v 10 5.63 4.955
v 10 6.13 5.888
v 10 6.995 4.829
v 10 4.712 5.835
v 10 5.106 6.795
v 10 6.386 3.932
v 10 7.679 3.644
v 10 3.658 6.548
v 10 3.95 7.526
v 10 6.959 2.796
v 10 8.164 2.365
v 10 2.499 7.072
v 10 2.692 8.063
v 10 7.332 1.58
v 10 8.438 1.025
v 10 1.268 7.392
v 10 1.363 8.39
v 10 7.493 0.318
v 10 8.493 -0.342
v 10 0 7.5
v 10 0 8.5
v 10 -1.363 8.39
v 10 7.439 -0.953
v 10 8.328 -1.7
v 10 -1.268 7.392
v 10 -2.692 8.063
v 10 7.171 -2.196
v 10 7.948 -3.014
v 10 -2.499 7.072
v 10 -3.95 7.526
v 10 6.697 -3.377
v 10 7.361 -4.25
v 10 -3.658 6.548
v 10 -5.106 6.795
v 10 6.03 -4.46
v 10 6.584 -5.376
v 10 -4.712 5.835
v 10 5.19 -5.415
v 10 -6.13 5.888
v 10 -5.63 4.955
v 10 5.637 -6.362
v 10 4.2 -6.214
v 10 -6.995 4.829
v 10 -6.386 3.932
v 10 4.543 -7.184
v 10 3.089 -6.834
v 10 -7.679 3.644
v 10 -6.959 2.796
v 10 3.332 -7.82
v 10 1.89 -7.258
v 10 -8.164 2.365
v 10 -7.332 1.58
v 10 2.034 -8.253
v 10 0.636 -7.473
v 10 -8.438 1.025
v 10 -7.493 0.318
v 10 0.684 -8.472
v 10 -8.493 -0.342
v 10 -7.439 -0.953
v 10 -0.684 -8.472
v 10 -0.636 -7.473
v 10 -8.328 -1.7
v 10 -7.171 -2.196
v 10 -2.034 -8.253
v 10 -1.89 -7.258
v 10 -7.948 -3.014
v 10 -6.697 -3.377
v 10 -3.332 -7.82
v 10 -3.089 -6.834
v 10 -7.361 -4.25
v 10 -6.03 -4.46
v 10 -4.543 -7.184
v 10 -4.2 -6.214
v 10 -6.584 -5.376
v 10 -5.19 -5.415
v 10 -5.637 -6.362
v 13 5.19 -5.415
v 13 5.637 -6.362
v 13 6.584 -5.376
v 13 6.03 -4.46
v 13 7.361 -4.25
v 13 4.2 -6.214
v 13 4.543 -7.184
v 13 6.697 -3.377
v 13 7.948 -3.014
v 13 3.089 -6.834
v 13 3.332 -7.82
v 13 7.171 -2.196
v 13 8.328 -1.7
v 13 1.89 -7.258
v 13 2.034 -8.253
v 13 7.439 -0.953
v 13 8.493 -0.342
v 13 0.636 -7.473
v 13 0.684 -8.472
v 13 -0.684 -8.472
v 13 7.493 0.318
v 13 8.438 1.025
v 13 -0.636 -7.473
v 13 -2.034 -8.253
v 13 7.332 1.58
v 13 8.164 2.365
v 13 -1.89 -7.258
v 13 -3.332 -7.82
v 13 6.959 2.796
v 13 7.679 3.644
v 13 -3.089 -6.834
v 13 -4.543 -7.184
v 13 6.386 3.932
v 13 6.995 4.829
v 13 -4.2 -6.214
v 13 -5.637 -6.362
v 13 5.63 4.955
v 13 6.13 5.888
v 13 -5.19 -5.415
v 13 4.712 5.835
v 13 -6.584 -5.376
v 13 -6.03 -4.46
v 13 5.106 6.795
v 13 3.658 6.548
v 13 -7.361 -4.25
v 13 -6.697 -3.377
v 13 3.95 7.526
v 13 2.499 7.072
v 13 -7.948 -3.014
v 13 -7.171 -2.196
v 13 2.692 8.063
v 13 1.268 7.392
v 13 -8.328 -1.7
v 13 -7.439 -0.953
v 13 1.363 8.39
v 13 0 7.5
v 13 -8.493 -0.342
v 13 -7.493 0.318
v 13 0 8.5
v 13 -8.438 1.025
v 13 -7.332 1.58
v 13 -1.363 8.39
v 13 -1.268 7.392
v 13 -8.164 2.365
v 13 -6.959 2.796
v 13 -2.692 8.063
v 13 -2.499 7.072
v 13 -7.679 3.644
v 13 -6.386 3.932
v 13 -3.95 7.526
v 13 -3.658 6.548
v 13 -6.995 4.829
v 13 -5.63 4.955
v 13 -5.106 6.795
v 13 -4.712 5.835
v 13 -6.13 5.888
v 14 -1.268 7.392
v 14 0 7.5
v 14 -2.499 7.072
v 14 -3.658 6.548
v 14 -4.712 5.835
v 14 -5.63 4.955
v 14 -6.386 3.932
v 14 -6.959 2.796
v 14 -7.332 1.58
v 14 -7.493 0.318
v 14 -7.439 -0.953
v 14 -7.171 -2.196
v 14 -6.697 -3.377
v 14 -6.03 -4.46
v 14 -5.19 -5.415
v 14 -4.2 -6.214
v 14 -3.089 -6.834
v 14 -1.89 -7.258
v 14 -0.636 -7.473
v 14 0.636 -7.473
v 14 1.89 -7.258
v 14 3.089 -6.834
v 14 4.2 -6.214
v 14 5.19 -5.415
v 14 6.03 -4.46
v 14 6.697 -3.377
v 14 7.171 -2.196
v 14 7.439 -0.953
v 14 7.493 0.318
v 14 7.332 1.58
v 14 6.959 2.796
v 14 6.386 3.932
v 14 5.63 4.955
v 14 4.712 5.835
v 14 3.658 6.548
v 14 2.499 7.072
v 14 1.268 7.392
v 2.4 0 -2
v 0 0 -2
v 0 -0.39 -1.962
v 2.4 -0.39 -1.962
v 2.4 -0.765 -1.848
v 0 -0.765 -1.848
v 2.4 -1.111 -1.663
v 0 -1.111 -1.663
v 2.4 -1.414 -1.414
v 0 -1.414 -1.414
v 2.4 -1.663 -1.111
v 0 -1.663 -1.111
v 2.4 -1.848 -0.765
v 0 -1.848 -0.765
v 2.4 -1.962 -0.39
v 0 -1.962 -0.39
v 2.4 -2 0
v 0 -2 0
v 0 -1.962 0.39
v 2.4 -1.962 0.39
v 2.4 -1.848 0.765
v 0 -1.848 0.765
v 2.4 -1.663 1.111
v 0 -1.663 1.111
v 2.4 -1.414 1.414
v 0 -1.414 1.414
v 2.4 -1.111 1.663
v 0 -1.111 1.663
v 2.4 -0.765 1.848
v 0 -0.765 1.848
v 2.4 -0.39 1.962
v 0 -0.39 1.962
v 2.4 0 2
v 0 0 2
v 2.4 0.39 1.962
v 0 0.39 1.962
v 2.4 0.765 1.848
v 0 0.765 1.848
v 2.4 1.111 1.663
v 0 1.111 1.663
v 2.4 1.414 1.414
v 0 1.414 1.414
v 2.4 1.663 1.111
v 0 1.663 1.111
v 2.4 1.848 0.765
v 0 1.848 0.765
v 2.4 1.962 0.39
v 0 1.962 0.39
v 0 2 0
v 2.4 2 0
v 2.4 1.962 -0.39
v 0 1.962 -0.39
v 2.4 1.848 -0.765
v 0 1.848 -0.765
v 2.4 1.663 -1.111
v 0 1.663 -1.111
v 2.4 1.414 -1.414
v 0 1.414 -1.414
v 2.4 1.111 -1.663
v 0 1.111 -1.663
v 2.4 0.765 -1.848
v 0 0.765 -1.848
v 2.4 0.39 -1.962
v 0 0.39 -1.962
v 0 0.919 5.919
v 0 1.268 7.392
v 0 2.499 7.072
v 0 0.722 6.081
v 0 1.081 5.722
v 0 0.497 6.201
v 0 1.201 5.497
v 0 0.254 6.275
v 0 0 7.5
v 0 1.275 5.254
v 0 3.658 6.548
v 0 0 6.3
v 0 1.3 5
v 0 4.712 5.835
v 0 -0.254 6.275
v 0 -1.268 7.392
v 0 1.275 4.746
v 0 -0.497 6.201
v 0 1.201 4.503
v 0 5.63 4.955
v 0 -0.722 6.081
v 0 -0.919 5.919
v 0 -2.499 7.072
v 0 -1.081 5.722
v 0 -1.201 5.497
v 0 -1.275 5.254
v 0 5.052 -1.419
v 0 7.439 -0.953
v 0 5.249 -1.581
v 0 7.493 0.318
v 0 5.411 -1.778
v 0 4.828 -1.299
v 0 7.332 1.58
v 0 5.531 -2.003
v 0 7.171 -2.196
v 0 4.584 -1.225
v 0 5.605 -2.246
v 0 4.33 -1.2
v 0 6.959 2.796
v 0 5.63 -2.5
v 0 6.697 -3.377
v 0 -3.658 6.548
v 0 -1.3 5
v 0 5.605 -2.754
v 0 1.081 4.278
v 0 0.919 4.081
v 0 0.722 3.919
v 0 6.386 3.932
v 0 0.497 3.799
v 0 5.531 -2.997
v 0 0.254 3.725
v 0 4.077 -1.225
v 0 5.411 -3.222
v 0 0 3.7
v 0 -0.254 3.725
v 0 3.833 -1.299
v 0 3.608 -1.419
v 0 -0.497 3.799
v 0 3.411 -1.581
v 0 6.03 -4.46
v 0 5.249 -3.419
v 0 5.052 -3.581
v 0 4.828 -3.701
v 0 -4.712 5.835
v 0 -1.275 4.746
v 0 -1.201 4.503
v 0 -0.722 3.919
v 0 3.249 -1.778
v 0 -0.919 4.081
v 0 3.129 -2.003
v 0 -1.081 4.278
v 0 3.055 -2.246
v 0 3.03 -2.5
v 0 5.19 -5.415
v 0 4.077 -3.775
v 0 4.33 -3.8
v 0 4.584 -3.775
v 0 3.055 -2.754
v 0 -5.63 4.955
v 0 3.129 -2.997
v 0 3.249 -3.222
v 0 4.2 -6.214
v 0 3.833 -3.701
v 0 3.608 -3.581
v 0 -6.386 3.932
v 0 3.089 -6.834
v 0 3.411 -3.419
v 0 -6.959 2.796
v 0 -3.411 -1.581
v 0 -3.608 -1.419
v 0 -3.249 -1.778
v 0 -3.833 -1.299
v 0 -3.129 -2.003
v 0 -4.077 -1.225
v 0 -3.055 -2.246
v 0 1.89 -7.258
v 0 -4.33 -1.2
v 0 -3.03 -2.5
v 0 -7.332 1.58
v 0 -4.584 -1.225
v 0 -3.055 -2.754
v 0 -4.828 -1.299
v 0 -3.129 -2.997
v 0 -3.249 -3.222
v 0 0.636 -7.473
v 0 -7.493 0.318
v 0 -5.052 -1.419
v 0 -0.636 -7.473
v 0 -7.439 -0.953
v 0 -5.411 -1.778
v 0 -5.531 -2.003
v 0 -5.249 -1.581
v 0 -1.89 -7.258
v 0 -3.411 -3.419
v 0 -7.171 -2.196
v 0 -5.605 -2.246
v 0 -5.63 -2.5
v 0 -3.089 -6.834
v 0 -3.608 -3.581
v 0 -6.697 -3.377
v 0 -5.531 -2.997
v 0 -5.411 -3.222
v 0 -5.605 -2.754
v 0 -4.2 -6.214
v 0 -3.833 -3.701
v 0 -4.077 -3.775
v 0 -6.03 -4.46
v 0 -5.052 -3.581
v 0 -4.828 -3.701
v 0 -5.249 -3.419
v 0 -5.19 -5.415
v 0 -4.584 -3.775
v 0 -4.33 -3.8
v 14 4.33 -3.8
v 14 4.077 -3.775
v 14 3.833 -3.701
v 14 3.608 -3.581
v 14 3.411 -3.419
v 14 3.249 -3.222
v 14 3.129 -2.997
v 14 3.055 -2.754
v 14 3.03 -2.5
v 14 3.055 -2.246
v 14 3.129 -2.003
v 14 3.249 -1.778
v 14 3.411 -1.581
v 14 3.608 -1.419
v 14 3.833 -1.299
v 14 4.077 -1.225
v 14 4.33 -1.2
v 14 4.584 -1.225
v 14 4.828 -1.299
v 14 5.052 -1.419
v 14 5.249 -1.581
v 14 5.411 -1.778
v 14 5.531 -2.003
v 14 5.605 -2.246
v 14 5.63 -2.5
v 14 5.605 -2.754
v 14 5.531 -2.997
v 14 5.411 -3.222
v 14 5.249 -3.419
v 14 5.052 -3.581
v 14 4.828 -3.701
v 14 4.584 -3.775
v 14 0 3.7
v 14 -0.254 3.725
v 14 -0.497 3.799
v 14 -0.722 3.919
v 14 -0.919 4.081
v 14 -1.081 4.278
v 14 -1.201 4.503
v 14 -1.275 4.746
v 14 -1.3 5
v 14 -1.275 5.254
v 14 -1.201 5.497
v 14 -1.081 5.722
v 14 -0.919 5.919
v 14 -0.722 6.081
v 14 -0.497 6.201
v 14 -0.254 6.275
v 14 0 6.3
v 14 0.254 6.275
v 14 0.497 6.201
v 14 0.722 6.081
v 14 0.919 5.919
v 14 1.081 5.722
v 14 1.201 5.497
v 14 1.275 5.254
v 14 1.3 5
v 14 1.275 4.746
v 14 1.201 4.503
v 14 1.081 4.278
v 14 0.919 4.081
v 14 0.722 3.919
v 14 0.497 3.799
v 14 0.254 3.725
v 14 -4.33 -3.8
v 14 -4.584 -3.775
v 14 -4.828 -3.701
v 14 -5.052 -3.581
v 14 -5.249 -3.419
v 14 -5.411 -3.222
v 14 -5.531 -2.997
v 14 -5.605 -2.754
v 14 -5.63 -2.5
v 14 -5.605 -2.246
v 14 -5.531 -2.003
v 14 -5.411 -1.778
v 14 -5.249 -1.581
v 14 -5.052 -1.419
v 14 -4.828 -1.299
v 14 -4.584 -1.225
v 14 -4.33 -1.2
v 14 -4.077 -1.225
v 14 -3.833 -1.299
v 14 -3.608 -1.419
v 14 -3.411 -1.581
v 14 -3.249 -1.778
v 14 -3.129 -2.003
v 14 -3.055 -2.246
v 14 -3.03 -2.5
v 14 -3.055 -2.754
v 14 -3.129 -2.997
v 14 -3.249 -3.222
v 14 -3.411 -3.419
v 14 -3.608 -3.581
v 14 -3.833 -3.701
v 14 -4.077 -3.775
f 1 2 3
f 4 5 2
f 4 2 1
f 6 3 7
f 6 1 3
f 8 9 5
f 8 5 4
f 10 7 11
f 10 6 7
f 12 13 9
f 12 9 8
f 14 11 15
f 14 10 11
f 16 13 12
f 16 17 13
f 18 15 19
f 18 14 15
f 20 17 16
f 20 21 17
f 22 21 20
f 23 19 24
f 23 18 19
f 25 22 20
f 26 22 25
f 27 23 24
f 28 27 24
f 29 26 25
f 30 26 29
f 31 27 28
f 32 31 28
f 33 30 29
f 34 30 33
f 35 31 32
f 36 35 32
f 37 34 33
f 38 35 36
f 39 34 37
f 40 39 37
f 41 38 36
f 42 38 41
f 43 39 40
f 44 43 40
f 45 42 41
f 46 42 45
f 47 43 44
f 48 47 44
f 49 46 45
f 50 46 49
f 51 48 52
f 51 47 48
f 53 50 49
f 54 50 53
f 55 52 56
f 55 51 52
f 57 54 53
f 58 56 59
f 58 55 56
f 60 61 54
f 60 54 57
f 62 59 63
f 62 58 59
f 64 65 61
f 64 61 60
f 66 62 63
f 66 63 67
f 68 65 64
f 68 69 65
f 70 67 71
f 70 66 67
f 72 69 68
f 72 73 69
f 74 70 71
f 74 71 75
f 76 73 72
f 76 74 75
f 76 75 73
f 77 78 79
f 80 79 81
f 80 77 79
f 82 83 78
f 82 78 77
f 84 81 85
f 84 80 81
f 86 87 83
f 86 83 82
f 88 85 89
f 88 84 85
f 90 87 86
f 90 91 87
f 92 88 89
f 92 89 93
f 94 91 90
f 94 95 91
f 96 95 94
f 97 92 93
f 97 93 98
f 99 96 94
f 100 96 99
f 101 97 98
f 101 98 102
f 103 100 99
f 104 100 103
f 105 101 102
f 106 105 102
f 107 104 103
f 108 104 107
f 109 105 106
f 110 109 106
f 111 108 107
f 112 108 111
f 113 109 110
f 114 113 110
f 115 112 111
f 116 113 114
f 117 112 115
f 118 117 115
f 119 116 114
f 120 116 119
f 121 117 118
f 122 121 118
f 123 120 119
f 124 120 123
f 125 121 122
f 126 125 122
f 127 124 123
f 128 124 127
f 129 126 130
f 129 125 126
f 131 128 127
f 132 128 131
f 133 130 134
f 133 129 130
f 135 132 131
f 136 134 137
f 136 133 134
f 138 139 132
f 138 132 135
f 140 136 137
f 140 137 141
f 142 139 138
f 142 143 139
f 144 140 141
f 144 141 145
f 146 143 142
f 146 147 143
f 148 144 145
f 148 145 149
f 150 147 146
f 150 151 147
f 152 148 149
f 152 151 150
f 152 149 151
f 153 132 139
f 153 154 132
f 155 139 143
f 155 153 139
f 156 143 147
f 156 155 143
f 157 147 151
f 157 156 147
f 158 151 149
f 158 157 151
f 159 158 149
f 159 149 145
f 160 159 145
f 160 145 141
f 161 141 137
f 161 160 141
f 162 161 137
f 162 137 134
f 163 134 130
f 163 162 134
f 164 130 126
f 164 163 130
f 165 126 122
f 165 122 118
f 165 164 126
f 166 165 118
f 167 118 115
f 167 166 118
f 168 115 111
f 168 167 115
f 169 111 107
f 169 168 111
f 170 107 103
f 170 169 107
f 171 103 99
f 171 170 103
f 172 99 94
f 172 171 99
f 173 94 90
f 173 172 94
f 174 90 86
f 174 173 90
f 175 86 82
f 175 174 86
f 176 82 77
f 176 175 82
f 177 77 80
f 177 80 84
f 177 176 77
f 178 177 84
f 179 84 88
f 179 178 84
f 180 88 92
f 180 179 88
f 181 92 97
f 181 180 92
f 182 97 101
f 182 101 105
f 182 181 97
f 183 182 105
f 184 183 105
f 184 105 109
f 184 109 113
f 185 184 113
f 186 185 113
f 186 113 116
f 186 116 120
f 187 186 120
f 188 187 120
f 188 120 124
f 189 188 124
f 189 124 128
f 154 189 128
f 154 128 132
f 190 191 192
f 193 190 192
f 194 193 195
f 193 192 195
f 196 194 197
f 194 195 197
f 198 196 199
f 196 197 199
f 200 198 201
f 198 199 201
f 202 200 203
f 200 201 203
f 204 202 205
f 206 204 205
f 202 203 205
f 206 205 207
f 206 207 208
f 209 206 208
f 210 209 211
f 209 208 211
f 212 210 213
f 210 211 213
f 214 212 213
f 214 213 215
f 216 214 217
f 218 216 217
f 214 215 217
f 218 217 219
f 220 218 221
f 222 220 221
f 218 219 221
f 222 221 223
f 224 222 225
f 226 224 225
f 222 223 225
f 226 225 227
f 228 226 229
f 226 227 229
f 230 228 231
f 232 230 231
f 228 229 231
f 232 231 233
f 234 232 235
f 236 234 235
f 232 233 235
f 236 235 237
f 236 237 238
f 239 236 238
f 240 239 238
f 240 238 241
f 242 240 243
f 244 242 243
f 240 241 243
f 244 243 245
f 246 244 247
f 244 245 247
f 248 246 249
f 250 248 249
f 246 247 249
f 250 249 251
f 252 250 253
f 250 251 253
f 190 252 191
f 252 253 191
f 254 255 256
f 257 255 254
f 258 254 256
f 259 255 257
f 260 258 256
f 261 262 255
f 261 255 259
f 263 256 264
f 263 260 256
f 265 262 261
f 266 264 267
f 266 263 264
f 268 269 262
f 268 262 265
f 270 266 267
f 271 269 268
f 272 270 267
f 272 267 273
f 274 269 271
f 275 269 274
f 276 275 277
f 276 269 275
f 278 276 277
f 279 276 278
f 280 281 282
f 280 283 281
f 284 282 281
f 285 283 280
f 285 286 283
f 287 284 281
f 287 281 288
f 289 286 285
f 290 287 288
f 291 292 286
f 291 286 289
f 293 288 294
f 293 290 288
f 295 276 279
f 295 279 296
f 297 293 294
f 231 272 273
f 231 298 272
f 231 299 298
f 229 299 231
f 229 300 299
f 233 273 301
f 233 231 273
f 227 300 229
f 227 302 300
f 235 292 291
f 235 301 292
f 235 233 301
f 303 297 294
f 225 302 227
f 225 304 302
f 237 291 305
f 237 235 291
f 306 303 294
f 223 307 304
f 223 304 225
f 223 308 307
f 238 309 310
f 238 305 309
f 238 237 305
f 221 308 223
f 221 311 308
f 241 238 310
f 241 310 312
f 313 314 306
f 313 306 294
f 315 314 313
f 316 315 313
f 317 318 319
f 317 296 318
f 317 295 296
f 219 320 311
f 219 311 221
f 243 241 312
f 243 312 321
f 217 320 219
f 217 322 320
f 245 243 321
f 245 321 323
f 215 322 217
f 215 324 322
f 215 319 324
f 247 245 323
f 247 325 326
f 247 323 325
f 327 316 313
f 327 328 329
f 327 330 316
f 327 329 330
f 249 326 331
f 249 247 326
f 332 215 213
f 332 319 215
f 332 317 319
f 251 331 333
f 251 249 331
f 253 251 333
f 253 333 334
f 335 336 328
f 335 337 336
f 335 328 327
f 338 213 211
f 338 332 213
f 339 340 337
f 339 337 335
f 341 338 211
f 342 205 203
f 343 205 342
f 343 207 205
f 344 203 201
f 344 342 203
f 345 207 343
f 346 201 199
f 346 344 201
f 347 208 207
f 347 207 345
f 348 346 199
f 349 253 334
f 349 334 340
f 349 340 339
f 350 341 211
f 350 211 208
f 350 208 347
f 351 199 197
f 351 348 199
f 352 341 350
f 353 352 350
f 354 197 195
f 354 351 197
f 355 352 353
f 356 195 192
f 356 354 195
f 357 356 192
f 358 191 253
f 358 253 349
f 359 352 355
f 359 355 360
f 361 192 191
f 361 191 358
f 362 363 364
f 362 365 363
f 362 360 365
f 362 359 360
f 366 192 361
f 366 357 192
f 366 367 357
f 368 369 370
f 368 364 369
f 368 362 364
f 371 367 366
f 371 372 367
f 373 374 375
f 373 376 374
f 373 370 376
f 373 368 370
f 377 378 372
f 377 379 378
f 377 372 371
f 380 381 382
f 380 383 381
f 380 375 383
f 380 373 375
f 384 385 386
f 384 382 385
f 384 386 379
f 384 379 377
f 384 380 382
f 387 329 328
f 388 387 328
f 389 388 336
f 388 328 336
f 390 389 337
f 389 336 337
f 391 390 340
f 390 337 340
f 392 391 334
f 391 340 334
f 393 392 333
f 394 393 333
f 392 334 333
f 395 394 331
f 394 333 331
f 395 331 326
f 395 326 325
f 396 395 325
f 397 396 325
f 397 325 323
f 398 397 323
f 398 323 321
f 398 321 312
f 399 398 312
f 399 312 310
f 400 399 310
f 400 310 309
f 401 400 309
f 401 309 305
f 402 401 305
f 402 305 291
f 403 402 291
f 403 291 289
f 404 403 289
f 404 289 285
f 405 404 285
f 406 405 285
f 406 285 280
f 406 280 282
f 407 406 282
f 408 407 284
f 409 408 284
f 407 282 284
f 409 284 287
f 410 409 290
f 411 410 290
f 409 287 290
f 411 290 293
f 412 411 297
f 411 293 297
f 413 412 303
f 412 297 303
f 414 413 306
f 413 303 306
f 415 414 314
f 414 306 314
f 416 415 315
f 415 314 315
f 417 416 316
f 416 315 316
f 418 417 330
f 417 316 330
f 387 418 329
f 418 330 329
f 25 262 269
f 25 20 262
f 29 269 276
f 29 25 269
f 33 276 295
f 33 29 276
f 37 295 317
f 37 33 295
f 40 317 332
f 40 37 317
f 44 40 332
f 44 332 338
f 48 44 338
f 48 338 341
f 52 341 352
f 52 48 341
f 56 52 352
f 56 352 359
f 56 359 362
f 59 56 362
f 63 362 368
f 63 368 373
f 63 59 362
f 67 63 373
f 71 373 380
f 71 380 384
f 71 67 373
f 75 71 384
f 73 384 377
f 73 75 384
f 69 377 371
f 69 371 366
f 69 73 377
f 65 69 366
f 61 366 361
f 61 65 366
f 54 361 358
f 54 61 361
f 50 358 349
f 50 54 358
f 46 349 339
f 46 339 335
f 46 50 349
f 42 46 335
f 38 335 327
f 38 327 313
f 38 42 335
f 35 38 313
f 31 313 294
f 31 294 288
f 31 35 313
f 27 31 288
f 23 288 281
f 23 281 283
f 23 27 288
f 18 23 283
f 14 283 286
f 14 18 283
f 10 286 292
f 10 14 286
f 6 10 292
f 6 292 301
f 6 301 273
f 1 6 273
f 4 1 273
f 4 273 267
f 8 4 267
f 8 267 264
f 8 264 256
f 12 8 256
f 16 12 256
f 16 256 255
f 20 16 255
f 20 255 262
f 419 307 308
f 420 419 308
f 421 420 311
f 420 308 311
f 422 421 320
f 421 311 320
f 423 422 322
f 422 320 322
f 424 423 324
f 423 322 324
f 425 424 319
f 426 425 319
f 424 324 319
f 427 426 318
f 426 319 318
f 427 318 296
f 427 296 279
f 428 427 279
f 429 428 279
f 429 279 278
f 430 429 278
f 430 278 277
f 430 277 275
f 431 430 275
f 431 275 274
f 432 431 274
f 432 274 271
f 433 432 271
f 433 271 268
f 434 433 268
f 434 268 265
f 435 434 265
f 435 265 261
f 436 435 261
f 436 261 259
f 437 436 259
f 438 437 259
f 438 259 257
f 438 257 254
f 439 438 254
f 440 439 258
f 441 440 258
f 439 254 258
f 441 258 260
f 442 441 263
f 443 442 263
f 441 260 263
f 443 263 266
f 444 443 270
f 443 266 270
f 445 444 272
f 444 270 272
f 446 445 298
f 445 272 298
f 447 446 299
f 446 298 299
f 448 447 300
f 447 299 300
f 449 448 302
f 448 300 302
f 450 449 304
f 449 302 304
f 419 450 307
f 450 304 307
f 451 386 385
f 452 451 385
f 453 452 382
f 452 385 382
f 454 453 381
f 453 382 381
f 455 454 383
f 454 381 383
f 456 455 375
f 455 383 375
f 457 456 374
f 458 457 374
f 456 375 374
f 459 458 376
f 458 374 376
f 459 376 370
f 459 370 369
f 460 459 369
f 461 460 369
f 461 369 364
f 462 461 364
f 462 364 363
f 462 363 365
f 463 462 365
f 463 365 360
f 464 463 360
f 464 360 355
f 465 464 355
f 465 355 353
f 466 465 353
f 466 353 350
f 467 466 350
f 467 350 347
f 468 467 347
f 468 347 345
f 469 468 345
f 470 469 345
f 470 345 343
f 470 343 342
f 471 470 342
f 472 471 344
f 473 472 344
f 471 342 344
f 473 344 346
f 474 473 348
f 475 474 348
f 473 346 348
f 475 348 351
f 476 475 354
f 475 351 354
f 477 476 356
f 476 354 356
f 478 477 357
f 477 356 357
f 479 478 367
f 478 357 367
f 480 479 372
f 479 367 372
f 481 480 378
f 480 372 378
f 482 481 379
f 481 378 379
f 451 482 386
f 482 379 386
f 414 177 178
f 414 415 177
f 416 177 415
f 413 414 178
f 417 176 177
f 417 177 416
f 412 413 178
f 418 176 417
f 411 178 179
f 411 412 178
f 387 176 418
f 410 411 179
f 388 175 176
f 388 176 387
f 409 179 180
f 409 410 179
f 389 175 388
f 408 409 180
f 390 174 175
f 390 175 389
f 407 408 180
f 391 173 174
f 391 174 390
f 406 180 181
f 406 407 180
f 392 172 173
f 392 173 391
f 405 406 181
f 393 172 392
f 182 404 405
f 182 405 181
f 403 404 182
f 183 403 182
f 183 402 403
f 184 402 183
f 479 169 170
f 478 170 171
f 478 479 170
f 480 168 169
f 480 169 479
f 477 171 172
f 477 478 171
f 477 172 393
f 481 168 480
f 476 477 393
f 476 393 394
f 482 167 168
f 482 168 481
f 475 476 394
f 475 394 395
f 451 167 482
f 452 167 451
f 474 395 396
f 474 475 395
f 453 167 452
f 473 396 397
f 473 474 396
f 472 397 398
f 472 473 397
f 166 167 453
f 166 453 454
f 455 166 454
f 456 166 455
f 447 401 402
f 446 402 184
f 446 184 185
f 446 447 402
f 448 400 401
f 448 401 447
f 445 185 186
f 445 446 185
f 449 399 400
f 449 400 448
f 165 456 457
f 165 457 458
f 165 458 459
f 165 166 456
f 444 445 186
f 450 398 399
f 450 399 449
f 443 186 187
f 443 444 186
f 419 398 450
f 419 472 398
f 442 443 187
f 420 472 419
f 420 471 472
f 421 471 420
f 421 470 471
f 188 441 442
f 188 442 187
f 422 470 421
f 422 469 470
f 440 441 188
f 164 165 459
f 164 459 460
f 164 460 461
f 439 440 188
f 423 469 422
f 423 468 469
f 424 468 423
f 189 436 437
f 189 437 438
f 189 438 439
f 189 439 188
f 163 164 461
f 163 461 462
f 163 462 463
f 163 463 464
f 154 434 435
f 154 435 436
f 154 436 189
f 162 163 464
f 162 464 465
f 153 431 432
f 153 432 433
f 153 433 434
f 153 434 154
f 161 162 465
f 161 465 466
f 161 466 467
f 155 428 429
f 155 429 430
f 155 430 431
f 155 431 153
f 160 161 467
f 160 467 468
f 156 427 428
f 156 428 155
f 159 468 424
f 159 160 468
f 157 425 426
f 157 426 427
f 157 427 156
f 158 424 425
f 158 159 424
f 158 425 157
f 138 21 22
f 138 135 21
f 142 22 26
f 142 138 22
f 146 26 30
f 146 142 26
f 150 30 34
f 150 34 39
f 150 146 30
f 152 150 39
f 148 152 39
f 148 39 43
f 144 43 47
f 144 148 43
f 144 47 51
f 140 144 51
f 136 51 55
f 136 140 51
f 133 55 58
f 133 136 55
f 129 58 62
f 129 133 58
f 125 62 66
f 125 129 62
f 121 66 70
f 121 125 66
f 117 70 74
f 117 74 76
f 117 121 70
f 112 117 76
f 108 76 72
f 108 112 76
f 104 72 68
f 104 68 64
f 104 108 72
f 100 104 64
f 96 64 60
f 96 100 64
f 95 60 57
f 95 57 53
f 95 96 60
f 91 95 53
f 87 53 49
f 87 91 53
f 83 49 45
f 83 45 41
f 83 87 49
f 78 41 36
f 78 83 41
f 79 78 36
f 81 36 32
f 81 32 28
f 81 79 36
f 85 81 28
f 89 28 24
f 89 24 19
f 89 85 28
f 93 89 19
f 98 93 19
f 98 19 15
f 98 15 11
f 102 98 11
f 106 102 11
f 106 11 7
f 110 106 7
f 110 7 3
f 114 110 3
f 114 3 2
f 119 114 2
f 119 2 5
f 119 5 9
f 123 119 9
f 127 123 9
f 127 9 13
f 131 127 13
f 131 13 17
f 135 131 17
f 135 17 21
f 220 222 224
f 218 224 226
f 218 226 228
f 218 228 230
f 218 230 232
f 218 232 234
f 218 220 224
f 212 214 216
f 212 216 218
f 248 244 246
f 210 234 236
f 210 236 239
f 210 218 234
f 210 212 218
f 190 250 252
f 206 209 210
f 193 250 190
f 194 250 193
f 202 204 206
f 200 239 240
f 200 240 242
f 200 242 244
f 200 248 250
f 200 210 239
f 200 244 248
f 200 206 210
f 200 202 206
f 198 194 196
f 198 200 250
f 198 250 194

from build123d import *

# Parameters (mm, degrees)
SKETCH102_R     = 1.3
POCKET010_DEPTH = 20
SKETCH103_R     = 2
POCKET011_DEPTH = 2.4


with BuildPart() as part:
    # Sketch101 → Revolution (revolve)
    with BuildSketch(Plane.XZ):
        Polygon((0, 0), (0, 7.5), (10, 7.5), (10, 8.5), (13, 8.5), (13, 7.5), (14, 7.5), (14, 0), align=None)
    revolve(axis=Axis((0, 0, 0), (1, 0, 0)))

    # Sketch102 (on DatumPlane) → Pocket010 (cut)
    with BuildSketch(Plane(origin=(0, 0, 0), x_dir=(0, 0, -1), z_dir=(-1, 0, 0))):
        with Locations((-5, 0)):
            Circle(SKETCH102_R)
        with Locations((2.5, -4.330127)):
            Circle(SKETCH102_R)
        with Locations((2.5, 4.330127)):
            Circle(SKETCH102_R)
    extrude(amount=-POCKET010_DEPTH, mode=Mode.SUBTRACT)

    # Sketch103 (on DatumPlane) → Pocket011 (cut)
    with BuildSketch(Plane(origin=(0, 0, 0), x_dir=(0, 0, -1), z_dir=(-1, 0, 0))):
        Circle(SKETCH103_R)
    extrude(amount=-POCKET011_DEPTH, mode=Mode.SUBTRACT)


solid = part.part
